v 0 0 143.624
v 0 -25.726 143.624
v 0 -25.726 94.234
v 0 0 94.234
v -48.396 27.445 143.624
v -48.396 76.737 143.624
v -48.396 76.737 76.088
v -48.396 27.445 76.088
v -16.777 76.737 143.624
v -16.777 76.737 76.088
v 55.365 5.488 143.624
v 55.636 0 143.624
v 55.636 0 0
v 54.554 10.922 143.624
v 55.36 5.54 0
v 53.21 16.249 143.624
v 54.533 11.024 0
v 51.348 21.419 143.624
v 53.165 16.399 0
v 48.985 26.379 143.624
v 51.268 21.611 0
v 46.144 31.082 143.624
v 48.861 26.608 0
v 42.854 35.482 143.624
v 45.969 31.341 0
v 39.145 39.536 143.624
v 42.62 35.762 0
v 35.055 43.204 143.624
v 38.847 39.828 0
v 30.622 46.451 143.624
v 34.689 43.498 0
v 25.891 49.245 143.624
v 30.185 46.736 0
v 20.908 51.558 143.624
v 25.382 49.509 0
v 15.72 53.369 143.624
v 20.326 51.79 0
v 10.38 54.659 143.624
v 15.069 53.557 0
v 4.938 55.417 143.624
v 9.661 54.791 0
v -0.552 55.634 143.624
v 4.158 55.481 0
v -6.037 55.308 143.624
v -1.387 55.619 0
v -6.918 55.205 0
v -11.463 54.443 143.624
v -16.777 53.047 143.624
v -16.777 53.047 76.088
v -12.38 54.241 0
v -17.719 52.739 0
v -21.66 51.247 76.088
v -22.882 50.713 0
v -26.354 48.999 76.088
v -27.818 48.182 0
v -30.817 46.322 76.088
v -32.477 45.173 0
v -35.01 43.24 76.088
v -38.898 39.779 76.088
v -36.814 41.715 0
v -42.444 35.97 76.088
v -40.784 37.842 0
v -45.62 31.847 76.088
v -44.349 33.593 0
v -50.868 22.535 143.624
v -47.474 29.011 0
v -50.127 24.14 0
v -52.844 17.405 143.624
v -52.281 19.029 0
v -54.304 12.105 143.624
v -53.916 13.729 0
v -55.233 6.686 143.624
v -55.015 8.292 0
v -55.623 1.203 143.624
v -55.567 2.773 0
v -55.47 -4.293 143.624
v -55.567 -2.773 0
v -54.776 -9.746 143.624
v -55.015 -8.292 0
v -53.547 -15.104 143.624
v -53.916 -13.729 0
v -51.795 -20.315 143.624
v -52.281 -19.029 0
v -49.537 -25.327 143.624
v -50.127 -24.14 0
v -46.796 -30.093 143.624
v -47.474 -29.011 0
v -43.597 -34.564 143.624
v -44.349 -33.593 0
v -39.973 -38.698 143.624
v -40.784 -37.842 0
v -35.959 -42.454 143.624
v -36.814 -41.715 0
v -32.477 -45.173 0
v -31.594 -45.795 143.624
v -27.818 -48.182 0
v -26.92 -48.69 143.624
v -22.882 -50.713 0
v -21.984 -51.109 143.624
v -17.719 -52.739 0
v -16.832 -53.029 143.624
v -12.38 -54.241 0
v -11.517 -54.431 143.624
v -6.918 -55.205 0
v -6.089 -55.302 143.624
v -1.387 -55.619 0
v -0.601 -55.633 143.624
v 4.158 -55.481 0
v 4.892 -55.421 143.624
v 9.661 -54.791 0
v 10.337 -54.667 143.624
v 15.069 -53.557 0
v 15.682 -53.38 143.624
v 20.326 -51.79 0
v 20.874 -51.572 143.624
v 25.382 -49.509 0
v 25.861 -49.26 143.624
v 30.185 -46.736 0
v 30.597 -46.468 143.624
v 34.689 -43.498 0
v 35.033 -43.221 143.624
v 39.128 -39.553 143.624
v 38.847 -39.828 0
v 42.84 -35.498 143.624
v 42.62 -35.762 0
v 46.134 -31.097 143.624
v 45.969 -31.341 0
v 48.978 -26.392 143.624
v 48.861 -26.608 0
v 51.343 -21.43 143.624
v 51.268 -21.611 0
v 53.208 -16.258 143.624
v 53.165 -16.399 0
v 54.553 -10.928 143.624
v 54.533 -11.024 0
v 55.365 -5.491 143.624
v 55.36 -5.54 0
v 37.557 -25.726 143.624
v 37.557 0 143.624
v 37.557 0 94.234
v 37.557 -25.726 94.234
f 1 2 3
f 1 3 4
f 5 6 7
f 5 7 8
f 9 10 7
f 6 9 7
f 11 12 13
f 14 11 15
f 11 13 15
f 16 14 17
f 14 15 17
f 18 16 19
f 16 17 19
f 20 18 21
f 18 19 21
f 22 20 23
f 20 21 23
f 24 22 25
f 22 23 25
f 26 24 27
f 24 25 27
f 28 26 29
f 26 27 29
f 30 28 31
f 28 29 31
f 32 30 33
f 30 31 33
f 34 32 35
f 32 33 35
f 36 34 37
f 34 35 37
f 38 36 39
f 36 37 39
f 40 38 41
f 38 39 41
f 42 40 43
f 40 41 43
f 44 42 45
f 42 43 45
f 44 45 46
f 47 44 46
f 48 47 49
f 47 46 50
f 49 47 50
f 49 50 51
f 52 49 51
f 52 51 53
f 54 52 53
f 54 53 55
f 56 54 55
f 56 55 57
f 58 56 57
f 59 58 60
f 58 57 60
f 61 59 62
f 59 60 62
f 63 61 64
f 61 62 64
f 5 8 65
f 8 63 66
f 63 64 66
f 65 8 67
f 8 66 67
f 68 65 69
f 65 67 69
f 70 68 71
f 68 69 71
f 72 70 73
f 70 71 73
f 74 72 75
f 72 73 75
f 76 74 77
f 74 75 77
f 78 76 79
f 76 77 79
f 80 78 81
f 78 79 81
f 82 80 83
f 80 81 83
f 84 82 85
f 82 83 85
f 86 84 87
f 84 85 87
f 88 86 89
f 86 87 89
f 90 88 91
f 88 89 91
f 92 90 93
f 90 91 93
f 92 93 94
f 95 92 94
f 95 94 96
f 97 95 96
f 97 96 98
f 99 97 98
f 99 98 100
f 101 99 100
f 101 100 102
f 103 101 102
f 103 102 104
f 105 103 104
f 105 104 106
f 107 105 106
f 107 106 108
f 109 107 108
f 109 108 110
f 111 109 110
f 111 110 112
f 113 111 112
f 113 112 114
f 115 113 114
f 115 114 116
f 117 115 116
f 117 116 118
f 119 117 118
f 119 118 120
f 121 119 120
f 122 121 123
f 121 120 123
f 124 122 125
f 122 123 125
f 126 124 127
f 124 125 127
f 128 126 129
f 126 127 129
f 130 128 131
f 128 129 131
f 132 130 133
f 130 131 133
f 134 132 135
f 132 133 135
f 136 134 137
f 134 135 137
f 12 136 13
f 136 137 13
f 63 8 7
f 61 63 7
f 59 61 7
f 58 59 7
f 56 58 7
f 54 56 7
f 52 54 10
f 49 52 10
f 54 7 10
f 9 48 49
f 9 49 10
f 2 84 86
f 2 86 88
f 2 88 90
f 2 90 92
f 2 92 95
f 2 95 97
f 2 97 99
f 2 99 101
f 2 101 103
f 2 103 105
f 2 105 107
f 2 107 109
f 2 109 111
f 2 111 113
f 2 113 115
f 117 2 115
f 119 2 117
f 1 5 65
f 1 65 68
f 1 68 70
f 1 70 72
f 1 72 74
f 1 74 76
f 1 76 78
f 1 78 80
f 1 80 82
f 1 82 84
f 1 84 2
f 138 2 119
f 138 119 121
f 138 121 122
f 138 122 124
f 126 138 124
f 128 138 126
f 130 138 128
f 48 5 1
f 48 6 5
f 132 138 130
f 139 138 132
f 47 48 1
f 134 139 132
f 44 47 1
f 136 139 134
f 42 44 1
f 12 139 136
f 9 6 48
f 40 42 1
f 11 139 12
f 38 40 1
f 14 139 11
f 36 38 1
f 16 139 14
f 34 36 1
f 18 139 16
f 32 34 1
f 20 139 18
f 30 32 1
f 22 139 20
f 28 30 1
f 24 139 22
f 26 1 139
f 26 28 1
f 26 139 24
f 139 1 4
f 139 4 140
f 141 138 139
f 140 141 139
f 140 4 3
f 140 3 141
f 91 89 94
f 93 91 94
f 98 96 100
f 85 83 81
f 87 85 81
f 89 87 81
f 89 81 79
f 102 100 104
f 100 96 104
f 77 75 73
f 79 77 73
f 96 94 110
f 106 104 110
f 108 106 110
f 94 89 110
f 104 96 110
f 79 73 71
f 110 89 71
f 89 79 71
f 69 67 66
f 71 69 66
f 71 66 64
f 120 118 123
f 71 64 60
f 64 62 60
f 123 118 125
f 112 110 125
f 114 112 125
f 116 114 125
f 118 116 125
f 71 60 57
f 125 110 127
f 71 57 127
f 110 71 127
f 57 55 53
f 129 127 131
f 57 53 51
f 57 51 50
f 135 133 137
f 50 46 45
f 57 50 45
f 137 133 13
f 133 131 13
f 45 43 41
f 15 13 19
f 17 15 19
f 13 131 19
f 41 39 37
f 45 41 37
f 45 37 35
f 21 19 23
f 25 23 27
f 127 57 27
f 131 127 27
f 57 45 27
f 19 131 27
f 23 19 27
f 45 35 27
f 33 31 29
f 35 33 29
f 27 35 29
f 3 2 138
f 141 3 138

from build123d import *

# Parameters (mm, degrees)
F0_R     = 55.6362832235
F1_DEPTH = 94.234
F3_R     = 55.6362832235
F3_W     = 37.5569760799
F3_H     = 25.7257614285
F4_DEPTH = 49.38980937
F6_DEPTH = 67.5356164575


with BuildPart() as f1:
    # F0 (on Top) → F1 (new body)
    with BuildSketch(Plane.XY):
        Circle(F0_R)
    extrude(amount=F1_DEPTH)

    # F3 (on face) → F4 (join)
    with BuildSketch(Plane.XY.offset(94.234)):
        Circle(F3_R)
        with Locations((18.77848804, -12.8628807142)):
            Rectangle(F3_W, F3_H, mode=Mode.SUBTRACT)
    extrude(amount=F4_DEPTH)

    # F5 (on face) → F6 (join)
    with BuildSketch(Plane.XY.offset(143.62380937)):
        with BuildLine():
            Line((-48.3959540725, 76.7373293638), (-48.3959540725, 27.4449929922))
            ThreePointArc((-48.3959540725, 27.4449929922), (-35.010462285, 43.2396061675), (-16.7768262327, 53.046527808))
            Line((-16.7768262327, 53.046527808), (-16.7768262327, 76.7373293638))
            Line((-16.7768262327, 76.7373293638), (-48.3959540725, 76.7373293638))
        make_face()
    extrude(amount=-F6_DEPTH)


solid = f1.part
